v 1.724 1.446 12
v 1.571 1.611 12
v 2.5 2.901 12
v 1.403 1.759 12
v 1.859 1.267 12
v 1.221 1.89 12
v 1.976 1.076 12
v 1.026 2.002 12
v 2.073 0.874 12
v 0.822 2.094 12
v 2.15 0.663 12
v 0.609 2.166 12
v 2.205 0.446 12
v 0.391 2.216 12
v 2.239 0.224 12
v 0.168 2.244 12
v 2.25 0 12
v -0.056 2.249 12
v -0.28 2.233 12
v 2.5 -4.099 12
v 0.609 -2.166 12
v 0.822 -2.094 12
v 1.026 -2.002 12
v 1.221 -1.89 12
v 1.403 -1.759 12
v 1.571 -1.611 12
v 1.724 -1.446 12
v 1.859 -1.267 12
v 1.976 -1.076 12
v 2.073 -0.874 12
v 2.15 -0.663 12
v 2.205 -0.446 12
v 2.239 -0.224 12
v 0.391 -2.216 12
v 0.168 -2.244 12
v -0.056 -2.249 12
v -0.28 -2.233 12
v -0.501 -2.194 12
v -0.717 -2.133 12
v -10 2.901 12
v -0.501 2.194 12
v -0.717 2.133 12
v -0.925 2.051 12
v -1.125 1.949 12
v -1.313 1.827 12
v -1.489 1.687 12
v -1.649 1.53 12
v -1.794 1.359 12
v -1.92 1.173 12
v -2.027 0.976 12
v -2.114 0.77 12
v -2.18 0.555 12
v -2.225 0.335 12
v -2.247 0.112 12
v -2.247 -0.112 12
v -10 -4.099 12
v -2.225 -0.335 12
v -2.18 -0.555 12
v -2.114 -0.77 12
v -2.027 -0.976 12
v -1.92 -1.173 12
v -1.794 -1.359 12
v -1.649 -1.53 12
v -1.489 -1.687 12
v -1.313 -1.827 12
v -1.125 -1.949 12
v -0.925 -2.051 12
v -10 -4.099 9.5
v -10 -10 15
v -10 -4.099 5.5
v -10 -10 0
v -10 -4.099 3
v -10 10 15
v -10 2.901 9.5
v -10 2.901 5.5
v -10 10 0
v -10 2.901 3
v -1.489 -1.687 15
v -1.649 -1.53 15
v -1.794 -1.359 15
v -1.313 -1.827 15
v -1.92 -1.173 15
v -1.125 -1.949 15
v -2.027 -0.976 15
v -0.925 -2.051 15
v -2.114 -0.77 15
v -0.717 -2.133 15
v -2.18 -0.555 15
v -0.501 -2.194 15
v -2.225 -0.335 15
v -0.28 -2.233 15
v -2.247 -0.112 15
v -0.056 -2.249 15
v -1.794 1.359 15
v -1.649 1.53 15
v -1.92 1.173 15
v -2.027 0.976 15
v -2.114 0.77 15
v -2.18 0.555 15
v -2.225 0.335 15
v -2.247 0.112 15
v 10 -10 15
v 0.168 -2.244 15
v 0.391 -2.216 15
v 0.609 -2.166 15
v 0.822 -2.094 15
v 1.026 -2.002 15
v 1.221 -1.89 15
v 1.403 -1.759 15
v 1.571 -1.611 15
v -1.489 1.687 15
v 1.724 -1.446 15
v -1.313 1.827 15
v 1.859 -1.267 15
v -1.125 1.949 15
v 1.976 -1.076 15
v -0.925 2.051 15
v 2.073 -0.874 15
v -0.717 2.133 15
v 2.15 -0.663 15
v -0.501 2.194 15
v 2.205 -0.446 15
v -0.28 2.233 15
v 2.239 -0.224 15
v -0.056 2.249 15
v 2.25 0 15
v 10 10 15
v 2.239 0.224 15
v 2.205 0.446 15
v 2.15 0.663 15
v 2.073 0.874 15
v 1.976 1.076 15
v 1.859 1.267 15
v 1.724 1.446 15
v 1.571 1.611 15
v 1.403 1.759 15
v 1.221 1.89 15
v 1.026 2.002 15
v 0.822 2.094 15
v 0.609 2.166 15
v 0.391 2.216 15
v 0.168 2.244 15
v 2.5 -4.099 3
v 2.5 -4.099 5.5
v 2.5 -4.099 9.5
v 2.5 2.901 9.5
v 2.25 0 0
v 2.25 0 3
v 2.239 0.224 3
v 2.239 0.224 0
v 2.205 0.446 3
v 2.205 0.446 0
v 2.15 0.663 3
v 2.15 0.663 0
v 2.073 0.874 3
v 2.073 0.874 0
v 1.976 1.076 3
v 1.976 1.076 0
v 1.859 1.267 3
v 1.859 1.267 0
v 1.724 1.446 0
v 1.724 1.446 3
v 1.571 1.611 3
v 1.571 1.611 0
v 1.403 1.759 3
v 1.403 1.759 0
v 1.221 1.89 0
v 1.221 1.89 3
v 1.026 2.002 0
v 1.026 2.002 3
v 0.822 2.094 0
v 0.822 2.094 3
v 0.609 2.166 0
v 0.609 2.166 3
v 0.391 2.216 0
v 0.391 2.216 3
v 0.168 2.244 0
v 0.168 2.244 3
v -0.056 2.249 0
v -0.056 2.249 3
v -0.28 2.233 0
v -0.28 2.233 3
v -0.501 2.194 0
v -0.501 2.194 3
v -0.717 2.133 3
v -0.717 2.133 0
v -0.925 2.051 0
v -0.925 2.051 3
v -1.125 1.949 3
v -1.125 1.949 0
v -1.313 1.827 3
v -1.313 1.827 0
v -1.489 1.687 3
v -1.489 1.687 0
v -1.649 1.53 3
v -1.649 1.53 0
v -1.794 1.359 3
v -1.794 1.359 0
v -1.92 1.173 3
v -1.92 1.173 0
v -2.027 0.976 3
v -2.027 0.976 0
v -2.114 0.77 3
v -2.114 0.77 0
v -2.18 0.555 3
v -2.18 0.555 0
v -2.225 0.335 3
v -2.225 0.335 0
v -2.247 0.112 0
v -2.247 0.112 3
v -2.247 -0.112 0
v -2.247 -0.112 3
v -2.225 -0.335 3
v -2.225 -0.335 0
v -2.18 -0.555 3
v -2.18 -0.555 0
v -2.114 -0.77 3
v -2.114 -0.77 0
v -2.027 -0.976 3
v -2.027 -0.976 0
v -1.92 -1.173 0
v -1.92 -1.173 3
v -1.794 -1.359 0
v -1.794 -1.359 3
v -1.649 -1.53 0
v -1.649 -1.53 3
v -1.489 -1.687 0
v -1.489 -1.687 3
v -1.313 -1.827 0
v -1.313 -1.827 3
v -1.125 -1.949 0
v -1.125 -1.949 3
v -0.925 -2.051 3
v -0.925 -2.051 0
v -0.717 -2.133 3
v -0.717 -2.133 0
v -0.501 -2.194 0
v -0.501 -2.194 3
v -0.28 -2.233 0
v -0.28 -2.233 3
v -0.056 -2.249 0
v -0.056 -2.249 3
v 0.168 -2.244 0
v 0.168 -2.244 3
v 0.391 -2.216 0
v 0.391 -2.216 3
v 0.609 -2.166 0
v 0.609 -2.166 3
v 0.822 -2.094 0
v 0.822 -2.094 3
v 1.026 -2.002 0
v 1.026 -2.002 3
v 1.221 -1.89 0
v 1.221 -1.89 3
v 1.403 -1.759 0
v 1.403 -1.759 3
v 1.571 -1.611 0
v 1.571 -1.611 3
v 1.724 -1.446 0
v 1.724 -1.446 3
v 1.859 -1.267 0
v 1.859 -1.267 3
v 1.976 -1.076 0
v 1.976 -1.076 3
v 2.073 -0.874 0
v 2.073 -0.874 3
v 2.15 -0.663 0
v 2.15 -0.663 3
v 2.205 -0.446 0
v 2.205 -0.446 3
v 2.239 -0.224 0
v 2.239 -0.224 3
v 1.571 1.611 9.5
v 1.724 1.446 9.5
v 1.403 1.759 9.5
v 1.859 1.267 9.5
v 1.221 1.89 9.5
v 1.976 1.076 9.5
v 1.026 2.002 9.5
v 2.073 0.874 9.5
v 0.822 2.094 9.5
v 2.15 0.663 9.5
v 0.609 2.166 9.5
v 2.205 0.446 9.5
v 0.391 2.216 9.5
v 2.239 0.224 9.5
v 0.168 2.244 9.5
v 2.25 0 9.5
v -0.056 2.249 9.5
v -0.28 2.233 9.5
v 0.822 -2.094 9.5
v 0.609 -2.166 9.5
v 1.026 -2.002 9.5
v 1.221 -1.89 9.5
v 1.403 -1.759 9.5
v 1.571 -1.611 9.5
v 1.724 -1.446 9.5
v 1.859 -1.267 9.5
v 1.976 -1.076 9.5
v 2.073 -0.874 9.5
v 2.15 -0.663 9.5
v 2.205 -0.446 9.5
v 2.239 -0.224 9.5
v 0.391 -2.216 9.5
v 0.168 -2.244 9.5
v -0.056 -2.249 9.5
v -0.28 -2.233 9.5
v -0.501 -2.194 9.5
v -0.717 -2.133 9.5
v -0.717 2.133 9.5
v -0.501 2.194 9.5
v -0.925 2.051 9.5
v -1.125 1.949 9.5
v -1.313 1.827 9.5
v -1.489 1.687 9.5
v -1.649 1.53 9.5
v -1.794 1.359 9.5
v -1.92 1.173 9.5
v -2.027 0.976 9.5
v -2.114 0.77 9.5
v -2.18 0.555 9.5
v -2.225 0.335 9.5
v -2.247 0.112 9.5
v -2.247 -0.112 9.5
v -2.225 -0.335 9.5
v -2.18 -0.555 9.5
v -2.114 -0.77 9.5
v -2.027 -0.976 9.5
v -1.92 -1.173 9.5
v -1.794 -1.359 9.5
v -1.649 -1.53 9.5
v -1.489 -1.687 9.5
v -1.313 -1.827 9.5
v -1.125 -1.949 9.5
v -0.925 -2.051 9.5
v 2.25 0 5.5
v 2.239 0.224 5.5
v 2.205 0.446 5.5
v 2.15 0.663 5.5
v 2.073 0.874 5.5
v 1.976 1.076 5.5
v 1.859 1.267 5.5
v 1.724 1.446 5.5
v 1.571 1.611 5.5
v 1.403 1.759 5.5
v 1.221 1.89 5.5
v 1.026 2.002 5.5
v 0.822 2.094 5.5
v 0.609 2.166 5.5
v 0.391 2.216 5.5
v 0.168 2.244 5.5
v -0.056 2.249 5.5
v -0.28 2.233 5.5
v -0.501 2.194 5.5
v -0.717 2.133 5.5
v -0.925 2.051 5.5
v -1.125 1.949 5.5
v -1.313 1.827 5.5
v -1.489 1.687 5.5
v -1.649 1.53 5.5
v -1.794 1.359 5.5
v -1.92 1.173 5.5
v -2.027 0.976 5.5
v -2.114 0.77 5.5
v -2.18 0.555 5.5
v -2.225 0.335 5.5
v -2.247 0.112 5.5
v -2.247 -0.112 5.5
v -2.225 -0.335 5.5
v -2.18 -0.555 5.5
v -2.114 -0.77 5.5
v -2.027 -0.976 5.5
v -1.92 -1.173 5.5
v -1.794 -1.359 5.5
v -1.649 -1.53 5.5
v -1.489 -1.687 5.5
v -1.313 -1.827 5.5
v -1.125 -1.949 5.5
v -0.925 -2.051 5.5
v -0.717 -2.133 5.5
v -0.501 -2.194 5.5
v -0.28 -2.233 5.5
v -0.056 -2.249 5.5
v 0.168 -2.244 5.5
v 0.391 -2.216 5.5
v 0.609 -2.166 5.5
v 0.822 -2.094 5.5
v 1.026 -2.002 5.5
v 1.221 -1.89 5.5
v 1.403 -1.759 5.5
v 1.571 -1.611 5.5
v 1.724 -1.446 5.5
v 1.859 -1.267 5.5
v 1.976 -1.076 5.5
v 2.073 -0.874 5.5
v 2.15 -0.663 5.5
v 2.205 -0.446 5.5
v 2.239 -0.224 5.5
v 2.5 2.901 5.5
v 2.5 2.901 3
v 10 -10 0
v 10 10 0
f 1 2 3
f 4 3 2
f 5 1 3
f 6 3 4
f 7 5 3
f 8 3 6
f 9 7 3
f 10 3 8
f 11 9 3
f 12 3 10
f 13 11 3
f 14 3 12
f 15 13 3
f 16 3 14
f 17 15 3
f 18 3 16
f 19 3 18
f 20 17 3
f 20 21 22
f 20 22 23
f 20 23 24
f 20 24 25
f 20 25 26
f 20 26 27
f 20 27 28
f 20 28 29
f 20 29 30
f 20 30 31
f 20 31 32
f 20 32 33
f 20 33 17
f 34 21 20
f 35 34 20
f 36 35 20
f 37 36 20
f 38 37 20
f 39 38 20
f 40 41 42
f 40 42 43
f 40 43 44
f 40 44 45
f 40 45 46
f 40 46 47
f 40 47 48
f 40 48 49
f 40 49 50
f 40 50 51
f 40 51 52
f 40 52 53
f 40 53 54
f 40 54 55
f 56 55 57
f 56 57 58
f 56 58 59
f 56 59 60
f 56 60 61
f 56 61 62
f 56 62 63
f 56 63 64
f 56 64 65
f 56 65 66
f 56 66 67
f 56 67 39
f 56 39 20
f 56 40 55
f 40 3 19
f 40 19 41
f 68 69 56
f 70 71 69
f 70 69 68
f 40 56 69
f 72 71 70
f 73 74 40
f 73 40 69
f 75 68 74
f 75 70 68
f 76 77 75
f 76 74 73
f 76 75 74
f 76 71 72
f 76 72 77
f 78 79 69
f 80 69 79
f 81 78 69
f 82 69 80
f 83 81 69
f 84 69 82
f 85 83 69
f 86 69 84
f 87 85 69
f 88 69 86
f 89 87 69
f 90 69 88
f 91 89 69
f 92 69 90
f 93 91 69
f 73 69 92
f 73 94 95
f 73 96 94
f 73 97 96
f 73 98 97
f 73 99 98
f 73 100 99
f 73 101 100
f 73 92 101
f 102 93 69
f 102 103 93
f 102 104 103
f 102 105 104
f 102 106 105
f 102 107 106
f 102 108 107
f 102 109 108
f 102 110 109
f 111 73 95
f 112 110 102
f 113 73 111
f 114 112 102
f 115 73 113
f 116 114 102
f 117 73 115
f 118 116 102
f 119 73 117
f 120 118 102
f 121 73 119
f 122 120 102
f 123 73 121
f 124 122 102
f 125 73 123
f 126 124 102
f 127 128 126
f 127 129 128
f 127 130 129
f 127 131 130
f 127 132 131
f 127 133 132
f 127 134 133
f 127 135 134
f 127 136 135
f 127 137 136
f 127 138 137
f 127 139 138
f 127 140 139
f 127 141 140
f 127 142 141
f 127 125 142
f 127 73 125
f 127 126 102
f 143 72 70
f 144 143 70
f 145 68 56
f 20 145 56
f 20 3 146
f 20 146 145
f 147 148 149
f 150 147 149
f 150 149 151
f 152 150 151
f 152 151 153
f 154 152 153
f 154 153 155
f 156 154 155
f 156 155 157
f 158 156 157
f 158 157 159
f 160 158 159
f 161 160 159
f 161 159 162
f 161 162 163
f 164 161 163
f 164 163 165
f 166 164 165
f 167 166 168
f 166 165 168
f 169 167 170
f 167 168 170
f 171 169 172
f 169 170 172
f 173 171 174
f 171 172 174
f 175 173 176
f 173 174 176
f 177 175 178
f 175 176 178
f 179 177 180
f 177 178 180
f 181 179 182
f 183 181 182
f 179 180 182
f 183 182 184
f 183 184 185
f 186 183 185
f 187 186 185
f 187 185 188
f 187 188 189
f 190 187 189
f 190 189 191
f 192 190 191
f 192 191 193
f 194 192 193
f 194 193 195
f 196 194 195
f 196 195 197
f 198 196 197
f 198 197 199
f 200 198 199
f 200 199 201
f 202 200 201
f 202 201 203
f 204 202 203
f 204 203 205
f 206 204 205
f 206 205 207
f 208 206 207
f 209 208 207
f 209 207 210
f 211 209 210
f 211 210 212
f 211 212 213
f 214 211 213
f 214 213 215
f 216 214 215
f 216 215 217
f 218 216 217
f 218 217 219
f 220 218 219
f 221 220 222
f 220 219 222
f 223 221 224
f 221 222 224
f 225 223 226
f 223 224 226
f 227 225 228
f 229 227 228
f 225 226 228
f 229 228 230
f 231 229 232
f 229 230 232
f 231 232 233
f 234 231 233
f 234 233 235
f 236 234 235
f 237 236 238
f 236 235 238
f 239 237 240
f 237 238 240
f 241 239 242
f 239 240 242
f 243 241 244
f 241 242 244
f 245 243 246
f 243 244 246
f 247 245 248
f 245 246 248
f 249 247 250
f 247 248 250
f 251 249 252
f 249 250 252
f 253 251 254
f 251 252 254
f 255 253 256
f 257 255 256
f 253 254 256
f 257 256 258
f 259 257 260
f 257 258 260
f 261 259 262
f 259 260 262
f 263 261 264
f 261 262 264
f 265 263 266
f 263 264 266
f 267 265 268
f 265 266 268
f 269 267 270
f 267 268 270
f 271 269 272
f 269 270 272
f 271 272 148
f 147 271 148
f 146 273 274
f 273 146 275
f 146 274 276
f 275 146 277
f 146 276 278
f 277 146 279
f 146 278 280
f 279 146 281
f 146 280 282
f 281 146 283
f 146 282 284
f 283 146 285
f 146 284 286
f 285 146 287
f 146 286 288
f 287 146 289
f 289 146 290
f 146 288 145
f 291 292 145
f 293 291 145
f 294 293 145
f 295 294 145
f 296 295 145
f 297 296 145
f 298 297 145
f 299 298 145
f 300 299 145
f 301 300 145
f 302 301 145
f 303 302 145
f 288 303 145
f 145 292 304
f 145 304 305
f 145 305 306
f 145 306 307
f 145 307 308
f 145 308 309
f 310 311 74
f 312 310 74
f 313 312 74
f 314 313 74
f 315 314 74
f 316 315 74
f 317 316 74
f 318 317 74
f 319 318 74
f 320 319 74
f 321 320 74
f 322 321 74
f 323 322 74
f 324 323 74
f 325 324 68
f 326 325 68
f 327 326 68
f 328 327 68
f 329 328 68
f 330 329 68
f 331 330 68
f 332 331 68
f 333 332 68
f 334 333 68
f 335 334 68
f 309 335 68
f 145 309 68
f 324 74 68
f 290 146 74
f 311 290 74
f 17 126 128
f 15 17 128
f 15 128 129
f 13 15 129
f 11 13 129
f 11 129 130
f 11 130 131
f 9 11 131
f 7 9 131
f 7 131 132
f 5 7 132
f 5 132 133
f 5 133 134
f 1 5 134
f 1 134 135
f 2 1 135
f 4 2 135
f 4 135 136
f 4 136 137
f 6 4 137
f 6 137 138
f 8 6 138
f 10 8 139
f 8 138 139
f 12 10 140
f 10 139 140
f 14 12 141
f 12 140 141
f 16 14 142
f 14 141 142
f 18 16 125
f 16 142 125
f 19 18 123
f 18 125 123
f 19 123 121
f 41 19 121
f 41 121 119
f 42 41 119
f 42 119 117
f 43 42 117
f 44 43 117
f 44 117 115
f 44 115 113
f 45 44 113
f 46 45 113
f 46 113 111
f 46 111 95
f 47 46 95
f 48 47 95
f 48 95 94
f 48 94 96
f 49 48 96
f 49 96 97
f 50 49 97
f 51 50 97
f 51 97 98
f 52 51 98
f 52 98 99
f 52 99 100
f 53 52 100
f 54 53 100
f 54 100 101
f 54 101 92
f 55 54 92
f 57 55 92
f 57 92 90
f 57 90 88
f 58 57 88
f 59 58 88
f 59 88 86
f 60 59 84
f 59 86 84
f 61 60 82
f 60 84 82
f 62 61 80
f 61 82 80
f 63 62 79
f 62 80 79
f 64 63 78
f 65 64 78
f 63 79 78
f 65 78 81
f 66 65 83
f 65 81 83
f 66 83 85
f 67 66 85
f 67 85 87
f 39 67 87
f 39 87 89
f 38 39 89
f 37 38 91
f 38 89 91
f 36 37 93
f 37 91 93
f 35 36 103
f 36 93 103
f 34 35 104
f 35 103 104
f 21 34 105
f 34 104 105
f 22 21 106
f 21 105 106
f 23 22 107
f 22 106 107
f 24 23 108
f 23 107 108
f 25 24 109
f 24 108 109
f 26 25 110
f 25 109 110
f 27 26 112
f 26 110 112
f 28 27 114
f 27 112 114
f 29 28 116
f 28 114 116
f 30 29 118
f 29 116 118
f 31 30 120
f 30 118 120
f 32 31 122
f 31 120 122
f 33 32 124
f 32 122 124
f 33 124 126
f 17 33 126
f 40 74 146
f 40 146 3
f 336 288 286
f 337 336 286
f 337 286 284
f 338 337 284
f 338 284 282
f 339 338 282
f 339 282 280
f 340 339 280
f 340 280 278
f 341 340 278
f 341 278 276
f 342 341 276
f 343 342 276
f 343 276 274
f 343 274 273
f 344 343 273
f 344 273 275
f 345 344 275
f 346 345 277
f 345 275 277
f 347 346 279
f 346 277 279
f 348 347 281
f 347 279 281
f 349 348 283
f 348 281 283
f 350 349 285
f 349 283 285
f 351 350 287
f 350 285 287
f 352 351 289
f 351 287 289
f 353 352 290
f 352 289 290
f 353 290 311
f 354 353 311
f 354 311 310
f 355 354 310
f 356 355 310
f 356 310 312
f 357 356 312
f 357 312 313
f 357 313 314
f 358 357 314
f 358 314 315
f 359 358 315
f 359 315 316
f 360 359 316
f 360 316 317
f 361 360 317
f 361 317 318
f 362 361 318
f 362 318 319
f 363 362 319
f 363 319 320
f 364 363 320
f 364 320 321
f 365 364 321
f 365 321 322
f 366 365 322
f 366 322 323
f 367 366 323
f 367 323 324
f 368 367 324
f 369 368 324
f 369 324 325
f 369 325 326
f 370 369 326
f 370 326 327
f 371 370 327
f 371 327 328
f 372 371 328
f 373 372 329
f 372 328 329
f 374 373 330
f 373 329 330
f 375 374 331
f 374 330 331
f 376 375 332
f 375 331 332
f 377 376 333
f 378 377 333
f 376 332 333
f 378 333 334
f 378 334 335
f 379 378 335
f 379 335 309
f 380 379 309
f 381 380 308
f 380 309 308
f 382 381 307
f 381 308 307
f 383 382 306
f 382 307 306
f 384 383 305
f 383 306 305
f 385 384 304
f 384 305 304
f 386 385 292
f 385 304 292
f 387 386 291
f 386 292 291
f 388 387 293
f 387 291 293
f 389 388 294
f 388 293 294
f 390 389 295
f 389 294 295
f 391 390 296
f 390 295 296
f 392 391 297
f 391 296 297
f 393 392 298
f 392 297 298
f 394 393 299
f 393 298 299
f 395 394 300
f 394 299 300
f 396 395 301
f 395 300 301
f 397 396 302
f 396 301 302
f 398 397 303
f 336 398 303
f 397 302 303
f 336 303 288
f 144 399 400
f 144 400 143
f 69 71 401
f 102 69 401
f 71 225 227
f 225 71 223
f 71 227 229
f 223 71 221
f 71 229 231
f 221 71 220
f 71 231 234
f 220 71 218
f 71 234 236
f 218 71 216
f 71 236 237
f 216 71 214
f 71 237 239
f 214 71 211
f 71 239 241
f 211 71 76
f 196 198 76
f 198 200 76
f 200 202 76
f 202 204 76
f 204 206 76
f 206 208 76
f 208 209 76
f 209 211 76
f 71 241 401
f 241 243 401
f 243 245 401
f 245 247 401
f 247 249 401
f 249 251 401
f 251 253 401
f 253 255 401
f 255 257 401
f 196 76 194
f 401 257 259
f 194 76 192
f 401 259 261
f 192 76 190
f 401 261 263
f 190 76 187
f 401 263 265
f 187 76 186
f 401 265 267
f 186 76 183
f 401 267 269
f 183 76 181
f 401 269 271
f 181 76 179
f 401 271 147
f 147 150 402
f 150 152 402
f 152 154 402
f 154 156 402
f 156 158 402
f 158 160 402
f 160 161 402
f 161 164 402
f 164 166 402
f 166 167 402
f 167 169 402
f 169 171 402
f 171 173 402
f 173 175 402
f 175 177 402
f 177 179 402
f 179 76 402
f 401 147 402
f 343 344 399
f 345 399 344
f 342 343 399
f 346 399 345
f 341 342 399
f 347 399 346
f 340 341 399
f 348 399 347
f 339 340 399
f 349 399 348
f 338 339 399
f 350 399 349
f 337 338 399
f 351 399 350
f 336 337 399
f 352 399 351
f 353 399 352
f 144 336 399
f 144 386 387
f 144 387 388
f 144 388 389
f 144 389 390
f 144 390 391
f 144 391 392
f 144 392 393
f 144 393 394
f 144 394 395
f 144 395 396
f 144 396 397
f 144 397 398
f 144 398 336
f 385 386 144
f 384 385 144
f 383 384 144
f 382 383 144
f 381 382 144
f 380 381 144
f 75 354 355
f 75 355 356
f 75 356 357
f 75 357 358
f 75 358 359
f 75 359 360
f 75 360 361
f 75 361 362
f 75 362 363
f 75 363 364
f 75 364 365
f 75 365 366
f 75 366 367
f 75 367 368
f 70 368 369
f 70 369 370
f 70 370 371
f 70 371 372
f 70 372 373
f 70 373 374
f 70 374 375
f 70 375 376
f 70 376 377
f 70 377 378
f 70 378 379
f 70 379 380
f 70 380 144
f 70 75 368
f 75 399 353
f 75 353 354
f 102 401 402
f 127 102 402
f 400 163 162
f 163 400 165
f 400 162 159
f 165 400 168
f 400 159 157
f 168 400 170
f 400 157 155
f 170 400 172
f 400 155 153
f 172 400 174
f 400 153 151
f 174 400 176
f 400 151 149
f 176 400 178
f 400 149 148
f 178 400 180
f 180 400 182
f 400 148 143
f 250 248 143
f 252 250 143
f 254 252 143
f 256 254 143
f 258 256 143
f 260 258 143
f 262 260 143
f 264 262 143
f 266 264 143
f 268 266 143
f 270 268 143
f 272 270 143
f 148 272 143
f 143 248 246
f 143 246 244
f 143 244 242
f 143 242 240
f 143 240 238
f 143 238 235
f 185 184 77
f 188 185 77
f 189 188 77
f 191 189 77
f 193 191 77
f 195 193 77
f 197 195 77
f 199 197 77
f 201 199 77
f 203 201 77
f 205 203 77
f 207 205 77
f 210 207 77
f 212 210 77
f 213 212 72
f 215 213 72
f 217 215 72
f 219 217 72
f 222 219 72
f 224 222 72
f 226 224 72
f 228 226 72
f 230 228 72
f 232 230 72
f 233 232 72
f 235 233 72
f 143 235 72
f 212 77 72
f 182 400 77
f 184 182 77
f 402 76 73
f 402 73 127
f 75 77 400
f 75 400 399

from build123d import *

# Parameters (mm, degrees)
F0_W     = 20
F0_H     = 20
F1_DEPTH = 15
F2_R     = 2.25
F3_DEPTH = 15.001
F4_W     = 7
F4_H     = 2.5
F5_DEPTH = 12.5


with BuildPart() as f1:
    # F0 (on Top) → F1 (new body)
    with BuildSketch(Plane.XY):
        Rectangle(F0_W, F0_H)
    extrude(amount=F1_DEPTH)

    # F2 (on face) → F3 (cut, through all)
    with BuildSketch(Plane.XY.offset(15)):
        Circle(F2_R)
    extrude(amount=-F3_DEPTH, mode=Mode.SUBTRACT)

    # F4 (on face) → F5 (cut)
    with BuildSketch(Plane(origin=(-10, 0, 0), x_dir=(0, -1, 0), z_dir=(-1, 0, 0))):
        with Locations((0.59865, 4.25)):
            Rectangle(F4_W, F4_H)
        with Locations((0.59865, 10.75)):
            Rectangle(F4_W, F4_H)
    extrude(amount=-F5_DEPTH, mode=Mode.SUBTRACT)


solid = f1.part
